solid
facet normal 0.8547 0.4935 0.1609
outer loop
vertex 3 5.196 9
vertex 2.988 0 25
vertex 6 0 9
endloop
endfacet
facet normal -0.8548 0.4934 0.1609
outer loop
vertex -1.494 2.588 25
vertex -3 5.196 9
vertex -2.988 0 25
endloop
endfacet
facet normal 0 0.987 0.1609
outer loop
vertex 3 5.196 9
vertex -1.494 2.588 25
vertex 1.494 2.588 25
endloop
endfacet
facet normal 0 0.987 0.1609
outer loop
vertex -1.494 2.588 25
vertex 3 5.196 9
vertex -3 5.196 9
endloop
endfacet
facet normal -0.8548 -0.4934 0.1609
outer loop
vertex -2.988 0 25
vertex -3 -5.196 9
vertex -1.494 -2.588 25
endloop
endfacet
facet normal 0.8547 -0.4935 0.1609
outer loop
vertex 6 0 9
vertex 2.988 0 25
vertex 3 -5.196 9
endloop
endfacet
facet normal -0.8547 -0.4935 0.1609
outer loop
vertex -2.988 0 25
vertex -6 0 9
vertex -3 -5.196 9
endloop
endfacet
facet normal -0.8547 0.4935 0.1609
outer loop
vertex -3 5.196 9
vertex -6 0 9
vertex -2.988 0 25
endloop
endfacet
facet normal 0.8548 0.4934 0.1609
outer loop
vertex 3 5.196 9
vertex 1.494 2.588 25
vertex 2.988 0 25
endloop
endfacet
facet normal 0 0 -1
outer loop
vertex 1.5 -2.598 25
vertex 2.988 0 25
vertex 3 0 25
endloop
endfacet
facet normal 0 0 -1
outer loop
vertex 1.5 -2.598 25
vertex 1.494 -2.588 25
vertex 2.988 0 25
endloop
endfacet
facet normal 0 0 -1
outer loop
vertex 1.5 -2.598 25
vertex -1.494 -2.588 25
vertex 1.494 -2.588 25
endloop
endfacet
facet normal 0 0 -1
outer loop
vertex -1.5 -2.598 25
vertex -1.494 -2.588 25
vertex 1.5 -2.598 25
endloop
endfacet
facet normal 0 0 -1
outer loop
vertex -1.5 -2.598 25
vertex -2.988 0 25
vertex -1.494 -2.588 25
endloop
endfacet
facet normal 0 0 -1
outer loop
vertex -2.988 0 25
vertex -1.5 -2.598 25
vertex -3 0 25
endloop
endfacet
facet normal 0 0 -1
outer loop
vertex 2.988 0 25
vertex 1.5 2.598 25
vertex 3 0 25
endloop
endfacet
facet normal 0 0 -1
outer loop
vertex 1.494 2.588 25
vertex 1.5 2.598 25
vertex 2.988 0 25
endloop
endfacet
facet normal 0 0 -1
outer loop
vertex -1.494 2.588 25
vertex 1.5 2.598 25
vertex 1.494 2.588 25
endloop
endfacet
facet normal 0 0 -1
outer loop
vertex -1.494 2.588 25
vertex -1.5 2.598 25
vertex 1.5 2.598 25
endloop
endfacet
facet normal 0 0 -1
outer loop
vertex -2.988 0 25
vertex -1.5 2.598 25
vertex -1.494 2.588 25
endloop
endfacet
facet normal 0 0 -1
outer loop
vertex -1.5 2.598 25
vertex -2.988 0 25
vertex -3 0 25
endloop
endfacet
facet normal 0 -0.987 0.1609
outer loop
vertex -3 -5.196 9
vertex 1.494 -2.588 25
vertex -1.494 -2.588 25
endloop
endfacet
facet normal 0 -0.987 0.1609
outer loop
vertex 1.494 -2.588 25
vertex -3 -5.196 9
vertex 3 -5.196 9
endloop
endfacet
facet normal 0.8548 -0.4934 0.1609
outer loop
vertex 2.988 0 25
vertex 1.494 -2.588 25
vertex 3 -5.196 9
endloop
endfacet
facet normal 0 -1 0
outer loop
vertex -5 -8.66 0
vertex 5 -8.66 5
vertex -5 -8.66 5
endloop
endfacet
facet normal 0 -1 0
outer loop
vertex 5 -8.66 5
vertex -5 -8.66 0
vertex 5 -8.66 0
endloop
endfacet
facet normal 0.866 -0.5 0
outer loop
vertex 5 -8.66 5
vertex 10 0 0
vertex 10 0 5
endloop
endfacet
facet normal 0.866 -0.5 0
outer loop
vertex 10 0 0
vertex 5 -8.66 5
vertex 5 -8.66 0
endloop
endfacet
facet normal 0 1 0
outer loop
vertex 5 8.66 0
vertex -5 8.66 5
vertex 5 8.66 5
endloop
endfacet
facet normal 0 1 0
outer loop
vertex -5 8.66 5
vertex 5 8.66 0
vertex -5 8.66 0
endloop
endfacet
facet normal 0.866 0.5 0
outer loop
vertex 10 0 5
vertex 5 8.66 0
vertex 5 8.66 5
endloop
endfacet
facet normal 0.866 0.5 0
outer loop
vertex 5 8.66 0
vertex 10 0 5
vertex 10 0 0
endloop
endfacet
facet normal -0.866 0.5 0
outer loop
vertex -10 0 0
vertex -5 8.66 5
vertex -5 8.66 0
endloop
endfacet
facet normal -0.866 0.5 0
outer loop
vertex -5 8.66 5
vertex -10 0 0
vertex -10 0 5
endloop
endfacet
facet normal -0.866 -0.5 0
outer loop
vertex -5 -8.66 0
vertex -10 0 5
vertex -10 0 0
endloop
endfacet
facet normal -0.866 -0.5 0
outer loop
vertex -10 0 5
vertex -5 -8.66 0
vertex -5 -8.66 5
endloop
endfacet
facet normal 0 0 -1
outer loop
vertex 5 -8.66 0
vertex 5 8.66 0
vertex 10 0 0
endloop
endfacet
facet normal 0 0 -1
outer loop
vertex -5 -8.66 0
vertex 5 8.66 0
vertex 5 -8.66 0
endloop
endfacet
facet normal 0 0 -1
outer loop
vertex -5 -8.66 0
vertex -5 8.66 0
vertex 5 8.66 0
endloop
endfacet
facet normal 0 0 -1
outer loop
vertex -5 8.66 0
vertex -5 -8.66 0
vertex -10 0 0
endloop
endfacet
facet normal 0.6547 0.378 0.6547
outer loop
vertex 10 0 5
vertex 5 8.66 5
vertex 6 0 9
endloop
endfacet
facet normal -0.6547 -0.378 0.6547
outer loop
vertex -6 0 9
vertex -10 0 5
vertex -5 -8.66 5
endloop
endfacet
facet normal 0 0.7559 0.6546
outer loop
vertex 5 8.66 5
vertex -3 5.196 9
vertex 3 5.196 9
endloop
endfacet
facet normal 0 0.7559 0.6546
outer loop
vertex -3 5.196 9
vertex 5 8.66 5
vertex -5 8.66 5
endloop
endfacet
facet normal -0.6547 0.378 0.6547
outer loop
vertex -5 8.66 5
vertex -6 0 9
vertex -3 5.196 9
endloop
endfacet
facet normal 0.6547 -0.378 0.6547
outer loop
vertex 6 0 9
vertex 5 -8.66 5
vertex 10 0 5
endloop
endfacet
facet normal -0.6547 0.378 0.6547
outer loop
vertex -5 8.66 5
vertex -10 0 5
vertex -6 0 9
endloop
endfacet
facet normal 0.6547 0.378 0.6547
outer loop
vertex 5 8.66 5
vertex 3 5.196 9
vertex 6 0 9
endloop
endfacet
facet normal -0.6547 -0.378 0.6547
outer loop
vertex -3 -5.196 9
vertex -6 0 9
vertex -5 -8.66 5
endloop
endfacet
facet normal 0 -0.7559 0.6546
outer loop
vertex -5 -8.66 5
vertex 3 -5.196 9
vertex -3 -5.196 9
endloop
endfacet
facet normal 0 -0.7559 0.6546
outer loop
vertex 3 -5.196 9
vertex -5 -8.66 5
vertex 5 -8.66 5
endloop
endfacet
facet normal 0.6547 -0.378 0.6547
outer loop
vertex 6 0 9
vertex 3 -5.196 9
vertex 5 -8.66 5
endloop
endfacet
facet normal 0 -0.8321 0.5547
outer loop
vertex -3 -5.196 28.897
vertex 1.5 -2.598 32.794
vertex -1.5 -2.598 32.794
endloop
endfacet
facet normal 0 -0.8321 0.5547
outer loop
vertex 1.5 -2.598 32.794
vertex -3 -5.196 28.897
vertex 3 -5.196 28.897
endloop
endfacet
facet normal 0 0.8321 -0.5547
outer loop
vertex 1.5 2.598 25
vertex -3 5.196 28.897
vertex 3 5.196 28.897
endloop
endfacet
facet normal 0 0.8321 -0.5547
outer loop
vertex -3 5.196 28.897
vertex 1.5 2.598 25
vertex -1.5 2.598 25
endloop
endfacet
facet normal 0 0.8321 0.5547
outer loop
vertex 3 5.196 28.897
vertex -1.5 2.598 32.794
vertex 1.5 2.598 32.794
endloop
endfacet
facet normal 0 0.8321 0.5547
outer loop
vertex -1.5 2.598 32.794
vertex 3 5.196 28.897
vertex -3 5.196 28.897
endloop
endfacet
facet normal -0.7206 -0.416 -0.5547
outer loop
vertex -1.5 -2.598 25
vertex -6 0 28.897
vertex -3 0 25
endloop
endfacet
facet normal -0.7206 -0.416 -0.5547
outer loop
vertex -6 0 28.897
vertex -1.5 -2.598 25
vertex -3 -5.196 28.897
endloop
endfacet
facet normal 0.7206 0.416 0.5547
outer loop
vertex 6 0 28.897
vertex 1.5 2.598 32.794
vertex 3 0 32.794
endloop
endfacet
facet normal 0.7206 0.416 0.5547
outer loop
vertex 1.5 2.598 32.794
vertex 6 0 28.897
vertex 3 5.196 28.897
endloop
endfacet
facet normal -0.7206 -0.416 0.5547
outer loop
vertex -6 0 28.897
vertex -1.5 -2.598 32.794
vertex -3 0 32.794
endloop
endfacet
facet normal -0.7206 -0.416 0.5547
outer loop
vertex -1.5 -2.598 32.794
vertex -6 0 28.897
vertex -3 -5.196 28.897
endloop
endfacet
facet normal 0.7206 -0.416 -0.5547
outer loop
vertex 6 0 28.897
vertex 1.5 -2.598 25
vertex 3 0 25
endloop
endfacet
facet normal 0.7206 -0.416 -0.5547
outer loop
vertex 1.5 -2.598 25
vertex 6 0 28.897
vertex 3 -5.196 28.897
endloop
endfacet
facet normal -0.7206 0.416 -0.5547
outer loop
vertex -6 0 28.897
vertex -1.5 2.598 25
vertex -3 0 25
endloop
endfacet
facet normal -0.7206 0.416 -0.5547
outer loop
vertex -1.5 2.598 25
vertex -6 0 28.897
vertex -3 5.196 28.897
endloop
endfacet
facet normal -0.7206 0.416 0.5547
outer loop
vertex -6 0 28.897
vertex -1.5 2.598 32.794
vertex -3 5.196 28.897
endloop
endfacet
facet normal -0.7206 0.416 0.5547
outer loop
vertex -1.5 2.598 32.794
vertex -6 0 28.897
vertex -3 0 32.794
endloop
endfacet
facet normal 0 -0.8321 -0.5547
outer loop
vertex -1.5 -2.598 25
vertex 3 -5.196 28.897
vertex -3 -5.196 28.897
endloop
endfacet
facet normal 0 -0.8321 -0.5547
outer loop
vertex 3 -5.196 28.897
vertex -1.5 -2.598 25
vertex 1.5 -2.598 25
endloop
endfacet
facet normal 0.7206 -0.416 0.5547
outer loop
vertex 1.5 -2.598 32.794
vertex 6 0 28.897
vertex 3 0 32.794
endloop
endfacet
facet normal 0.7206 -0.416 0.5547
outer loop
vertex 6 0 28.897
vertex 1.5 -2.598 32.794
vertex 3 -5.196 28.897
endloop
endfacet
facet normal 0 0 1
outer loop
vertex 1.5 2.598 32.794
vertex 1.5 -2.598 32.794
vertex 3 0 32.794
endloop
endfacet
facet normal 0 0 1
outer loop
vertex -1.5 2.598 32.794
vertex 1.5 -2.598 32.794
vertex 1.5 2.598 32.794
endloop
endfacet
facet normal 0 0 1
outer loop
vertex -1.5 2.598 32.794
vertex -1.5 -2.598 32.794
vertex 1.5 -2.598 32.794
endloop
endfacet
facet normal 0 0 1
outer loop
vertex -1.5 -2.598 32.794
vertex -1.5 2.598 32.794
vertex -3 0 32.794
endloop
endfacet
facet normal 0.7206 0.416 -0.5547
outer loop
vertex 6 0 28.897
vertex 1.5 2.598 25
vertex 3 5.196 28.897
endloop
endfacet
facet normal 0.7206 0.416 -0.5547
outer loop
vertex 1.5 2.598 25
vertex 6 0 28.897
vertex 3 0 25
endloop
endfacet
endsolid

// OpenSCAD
// file: piece_base.scad
include <config.scad>;

module piece_base(height,top_diam){
	union(){
		translate([0,0,base_height+(base_diam-piece_diam)/2])
		cylinder(r1=piece_diam/2,r2=top_diam/2,h=height-base_height-(base_diam-piece_diam)/2);
		cylinder(r=base_diam/2,h=base_height);
		translate([0,0,base_height])
			cylinder(r1=base_diam/2,
						r2=piece_diam/2,
						h=(base_diam-piece_diam)/2);
	}
}

piece_base(pawn_height,piece_diam*0.6);
// file: config.scad
piece_diam = 12;
base_diam = 20;
base_height = 5;
pawn_height = 25;


$fn=6;
// main file
include <config.scad>;
use <piece_base.scad>;

ball_size = 0.6;
squash = 0.75;

module pawn(){
	union(){
		piece_base(pawn_height,piece_diam*ball_size*0.83);
		translate([0,0,pawn_height+squash*ball_size*base_diam*cos(30)/2])	
			scale([1,1,squash])
				sphere(r=ball_size*base_diam/2);
	}
}

pawn();
